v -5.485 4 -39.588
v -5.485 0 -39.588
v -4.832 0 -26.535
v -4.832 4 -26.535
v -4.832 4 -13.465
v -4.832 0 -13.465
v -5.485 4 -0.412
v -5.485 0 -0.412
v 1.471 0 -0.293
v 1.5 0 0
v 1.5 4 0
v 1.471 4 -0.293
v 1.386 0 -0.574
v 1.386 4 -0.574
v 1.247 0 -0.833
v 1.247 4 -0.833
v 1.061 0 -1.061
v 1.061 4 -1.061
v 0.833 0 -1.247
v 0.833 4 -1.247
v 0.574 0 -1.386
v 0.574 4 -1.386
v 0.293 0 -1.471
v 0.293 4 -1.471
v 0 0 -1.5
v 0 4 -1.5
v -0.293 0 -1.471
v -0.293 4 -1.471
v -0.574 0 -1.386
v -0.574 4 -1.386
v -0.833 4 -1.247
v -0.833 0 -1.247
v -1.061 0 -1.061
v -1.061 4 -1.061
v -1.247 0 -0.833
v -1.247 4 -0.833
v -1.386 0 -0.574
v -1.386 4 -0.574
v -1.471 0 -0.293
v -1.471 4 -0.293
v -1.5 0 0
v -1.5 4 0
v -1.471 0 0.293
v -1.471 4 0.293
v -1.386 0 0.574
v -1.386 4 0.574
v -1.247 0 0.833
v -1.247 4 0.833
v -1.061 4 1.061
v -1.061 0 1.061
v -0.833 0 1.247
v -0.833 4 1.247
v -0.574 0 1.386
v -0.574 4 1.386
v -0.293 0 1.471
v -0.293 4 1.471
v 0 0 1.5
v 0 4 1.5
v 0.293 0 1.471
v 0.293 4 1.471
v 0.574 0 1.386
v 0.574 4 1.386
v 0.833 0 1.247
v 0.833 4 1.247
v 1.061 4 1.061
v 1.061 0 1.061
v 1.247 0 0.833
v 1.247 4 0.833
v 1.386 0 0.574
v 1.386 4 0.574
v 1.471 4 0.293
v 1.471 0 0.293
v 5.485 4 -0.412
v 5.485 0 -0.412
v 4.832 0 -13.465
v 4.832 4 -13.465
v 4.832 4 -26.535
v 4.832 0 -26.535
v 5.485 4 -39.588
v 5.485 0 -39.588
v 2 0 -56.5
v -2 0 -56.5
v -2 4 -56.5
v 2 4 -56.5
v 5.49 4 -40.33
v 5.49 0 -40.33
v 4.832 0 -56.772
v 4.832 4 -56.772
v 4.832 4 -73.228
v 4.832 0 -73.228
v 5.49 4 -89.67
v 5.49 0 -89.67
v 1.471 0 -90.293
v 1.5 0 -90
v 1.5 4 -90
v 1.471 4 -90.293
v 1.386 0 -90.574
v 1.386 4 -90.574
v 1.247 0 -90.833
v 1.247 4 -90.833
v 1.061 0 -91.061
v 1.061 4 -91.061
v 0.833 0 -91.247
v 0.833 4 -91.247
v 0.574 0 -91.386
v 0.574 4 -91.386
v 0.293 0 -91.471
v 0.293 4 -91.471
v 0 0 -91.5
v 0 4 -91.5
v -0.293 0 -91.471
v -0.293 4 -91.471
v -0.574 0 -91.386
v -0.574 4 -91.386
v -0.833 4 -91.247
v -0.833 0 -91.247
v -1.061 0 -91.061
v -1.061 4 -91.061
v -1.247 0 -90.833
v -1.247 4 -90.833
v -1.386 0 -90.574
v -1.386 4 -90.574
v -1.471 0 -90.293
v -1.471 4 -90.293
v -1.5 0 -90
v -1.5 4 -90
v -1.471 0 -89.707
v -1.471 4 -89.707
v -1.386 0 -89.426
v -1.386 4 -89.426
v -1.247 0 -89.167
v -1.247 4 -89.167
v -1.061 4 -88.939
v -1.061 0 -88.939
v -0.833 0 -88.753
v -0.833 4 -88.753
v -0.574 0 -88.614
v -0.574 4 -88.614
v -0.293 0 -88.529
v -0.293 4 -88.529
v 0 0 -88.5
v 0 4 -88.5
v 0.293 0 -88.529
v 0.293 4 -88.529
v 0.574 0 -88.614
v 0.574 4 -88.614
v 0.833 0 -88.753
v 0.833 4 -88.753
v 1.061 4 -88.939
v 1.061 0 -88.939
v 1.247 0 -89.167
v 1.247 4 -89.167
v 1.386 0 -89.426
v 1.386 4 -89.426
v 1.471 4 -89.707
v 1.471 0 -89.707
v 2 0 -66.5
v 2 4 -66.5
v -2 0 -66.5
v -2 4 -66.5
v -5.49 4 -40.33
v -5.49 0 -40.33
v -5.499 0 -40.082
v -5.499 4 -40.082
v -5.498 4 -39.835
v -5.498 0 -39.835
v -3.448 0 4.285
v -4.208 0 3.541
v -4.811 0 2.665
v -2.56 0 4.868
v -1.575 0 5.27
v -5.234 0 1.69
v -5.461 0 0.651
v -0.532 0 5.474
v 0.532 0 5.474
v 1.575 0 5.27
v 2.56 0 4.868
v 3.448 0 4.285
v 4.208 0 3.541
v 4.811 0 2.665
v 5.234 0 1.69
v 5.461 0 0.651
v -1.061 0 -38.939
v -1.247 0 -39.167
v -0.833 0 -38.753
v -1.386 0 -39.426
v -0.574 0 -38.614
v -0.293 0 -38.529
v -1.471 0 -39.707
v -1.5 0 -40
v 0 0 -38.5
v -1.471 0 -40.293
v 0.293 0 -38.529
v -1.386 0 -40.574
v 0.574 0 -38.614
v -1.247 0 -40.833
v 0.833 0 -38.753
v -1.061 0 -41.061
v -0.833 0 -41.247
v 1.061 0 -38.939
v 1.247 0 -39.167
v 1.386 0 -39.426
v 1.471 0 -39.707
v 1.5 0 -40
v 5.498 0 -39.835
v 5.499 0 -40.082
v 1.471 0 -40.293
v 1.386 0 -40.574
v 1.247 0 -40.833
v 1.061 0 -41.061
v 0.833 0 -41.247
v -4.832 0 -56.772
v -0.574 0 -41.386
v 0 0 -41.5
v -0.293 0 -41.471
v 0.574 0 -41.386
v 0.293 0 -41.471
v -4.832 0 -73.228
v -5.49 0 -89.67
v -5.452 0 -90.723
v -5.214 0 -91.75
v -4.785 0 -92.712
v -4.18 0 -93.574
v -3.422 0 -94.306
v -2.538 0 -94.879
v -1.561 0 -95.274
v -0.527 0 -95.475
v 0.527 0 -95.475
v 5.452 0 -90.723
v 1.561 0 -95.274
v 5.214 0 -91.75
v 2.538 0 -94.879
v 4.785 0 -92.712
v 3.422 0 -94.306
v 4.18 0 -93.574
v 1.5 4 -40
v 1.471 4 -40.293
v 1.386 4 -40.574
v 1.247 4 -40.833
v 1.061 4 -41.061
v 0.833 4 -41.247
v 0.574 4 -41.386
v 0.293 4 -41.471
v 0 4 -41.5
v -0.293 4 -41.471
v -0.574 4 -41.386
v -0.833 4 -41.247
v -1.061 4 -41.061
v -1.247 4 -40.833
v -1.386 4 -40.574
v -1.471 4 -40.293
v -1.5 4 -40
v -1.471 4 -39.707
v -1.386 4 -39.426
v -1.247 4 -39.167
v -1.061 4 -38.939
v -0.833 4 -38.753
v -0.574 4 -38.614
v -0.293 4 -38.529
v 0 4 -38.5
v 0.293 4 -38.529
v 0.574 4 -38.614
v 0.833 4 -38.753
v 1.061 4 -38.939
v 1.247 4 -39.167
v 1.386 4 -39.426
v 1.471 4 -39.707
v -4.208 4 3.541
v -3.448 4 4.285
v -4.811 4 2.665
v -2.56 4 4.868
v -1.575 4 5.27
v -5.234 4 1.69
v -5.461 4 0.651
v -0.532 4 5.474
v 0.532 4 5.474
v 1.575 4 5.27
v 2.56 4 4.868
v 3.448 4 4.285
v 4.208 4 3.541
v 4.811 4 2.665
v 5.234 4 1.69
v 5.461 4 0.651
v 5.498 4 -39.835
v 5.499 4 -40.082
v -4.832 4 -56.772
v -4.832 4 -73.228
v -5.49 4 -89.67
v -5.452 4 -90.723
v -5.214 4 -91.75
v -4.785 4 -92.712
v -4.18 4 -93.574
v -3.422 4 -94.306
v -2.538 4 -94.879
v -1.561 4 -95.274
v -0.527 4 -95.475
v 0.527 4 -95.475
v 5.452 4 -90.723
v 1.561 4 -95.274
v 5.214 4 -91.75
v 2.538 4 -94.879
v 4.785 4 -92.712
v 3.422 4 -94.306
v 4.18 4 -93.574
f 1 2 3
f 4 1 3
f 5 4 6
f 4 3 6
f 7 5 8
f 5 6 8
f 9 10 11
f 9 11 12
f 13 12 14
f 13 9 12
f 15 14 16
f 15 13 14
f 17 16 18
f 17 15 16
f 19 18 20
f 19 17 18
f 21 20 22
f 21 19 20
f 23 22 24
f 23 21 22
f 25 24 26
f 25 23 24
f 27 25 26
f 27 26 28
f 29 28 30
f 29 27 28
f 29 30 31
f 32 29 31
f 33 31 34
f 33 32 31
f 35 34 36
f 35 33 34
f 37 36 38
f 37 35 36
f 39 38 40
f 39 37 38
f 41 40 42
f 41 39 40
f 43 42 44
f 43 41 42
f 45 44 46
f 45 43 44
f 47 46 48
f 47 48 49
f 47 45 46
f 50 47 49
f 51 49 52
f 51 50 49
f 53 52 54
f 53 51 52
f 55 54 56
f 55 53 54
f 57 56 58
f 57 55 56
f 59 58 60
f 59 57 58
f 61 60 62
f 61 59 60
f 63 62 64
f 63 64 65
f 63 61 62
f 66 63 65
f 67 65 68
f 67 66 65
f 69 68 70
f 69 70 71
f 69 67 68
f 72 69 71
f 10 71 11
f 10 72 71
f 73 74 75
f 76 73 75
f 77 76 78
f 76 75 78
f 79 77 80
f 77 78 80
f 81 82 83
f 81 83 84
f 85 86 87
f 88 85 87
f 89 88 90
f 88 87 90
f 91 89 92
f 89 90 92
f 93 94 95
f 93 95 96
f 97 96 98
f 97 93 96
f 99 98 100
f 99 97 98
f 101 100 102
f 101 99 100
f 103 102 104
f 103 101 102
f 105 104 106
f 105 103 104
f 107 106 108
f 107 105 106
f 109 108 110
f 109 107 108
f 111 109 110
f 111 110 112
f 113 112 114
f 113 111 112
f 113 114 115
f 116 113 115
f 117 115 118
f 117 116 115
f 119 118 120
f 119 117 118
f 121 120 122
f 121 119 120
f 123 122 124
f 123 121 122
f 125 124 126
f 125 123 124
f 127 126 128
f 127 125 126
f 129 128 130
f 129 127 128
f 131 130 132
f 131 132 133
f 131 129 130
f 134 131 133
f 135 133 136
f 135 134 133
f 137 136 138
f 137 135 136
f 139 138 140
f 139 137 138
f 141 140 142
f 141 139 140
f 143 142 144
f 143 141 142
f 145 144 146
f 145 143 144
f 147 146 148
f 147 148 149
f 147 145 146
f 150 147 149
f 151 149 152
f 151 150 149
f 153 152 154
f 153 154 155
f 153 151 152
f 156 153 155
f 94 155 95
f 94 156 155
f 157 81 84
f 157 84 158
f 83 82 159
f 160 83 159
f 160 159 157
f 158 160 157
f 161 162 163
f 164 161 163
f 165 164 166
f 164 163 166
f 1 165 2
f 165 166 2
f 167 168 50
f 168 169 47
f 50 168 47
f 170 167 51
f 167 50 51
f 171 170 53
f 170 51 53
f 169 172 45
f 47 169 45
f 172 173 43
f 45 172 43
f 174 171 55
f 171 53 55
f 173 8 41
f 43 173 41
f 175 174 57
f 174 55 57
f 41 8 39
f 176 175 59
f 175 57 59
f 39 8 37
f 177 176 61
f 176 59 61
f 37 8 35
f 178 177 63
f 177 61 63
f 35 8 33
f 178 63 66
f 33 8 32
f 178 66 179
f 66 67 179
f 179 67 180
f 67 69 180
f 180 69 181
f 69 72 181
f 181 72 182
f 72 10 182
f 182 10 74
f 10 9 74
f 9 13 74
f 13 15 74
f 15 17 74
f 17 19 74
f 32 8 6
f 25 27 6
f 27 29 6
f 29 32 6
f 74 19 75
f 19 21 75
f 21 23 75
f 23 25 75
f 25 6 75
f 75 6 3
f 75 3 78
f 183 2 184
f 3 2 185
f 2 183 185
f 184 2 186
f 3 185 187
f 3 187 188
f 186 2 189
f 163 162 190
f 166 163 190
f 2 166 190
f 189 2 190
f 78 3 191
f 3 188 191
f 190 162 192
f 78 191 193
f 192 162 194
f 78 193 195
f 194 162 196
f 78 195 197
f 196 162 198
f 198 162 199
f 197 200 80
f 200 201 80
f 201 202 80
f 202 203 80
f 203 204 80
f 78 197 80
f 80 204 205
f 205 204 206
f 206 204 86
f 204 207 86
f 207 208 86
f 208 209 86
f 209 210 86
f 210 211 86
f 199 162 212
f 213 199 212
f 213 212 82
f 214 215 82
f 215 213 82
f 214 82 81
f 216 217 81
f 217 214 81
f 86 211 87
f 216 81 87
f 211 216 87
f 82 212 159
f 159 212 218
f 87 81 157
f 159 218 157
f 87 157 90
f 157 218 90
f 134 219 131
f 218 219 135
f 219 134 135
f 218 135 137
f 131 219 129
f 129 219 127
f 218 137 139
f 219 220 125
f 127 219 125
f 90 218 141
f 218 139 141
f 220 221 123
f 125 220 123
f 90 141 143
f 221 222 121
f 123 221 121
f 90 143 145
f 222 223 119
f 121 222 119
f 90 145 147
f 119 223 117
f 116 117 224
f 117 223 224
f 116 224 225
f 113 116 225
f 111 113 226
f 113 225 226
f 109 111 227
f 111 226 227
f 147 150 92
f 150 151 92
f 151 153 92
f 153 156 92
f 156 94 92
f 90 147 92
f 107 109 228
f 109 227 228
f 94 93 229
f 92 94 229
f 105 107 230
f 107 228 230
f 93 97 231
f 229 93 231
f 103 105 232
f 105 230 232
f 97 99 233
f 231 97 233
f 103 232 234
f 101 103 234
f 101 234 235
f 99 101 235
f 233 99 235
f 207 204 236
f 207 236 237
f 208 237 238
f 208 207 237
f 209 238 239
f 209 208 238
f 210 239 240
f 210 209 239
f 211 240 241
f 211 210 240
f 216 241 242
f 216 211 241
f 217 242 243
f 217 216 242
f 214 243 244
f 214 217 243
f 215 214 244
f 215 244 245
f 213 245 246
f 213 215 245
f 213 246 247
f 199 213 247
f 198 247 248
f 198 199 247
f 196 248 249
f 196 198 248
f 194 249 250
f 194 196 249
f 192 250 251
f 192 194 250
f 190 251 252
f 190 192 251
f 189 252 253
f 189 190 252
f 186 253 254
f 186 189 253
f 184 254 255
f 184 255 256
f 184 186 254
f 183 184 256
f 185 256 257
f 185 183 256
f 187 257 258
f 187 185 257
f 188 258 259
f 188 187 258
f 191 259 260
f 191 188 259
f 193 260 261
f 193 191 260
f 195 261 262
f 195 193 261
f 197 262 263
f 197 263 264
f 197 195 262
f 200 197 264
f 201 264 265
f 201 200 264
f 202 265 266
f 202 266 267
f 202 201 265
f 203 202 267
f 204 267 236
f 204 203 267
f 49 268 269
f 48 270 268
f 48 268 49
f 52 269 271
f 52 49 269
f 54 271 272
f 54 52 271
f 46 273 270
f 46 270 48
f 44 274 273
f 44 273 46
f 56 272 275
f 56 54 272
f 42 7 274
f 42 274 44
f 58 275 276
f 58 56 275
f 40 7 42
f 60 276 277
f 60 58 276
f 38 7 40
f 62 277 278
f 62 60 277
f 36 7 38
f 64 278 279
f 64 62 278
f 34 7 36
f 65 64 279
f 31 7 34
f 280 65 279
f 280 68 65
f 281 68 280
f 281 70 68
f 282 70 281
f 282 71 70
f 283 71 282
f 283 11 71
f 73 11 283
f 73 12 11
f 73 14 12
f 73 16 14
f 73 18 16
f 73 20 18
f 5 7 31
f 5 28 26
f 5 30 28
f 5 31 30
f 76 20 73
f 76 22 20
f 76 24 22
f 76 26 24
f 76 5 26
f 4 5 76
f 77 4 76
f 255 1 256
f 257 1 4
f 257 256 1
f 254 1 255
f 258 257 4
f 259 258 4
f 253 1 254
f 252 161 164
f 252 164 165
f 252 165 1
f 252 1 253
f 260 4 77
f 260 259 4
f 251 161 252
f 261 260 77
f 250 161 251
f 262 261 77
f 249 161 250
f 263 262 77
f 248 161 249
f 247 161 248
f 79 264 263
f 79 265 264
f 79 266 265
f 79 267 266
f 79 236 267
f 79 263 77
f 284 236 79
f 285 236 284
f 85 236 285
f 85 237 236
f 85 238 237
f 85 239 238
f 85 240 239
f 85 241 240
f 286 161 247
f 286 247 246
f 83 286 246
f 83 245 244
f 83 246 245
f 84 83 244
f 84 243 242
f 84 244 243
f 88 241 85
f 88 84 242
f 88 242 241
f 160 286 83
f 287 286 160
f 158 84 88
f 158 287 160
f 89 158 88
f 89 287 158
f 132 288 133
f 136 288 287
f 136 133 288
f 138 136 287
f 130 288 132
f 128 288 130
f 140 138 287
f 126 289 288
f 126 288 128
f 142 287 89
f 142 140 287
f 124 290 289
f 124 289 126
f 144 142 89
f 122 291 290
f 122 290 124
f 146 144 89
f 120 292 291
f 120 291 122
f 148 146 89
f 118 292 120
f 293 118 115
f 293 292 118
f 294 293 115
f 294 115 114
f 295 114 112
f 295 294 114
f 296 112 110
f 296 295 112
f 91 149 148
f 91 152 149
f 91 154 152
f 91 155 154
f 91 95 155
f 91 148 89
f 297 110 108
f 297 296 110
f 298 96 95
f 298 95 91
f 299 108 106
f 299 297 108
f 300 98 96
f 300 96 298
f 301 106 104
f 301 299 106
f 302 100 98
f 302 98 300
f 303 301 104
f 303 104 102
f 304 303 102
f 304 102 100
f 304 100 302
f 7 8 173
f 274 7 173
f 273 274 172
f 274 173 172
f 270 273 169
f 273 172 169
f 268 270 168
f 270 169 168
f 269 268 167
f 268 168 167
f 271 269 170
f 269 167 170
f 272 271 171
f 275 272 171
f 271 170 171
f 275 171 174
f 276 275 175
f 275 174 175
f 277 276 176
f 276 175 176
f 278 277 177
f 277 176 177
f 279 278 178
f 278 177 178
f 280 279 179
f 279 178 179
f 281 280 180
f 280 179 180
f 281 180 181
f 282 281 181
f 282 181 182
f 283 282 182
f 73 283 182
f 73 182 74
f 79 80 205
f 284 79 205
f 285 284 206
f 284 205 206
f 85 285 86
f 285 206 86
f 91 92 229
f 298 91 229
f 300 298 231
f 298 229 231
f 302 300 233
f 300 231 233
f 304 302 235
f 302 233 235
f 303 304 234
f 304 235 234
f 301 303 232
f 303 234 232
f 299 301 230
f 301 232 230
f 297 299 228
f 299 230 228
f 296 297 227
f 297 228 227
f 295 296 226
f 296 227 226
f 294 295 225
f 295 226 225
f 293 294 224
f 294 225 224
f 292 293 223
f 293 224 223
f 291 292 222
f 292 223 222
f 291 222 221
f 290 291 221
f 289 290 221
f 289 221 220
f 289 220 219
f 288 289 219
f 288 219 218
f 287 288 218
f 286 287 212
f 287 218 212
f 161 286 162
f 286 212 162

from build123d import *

# Parameters (mm, degrees)
SKETCH1_R           = 1.5
SKETCH1_W           = 4
SKETCH1_H           = 10
BOSS_EXTRUDE1_DEPTH = 4


with BuildPart() as part:
    # Sketch1 → Boss-Extrude1 (new body)
    with BuildSketch(Plane(origin=(0, 0, 0), x_dir=(1, 0, 0), z_dir=(0, 1, 0))):
        with BuildLine():
            ThreePointArc((-5.484552972, 0.411920736), (0, -5.5), (5.484552972, 0.411920736))
            ThreePointArc((5.484552972, 0.411920736), (4.75, 20), (5.484552972, 39.588079264))
            ThreePointArc((5.484552972, 39.588079264), (5.499845666, 39.95879751), (5.490108902, 40.329703267))
            ThreePointArc((5.490108902, 40.329703267), (4.75, 65), (5.490108902, 89.670296733))
            ThreePointArc((5.490108902, 89.670296733), (0, 95.5), (-5.490108902, 89.670296733))
            ThreePointArc((-5.490108902, 89.670296733), (-4.75, 65), (-5.490108902, 40.329703267))
            ThreePointArc((-5.490108902, 40.329703267), (-5.499845666, 39.95879751), (-5.484552972, 39.588079264))
            ThreePointArc((-5.484552972, 39.588079264), (-4.75, 20), (-5.484552972, 0.411920736))
        make_face()
        Circle(SKETCH1_R, mode=Mode.SUBTRACT)
        with Locations((0, 90)):
            Circle(SKETCH1_R, mode=Mode.SUBTRACT)
        with Locations((0, 40)):
            Circle(SKETCH1_R, mode=Mode.SUBTRACT)
        with Locations((0, 61.5)):
            Rectangle(SKETCH1_W, SKETCH1_H, mode=Mode.SUBTRACT)
    extrude(amount=BOSS_EXTRUDE1_DEPTH)


solid = part.part
